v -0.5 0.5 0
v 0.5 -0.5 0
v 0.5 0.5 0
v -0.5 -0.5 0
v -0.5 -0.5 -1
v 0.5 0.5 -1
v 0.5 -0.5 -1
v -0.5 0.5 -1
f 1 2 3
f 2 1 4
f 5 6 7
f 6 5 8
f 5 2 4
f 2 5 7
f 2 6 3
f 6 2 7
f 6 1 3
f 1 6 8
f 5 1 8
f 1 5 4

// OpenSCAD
// http://www.openscad.org/downloads.html

h180= 2.23606798;
h90 = 2.05817103;
h60 = 1.73205081;
h45 = 1.42663106;
h36 = 1.25226119;

a180  = 0.44721359;
ZL180 = 0.89442719; ZH180 = h180 - ZL180;
points_list180 = [
    [ 0,     0,    0     ],
    [ a180,  0,    ZL180 ],
    [-a180,  0,    ZH180 ],
    [ 0,     0,    h180  ]];

a_90  = 0.61803398;
ZL_90 = 0.78615138; ZH_90 = h90 - ZL_90;
points_list90 = [
    [ 0,     0,    0     ],
    [ a_90,  0,    ZL_90 ],
    [ 0,     a_90, ZH_90 ],
    [-a_90,  0,    ZL_90 ],
    [ 0,    -a_90, ZH_90 ],
    [ 0,     0,    h90   ]];

a_60  = 0.81649658; s32   = 0.86602540;
ZL_60 = 0.57735027; ZH_60 = h60 - ZL_60;
points_list60 = [
    [ 0,         0,        0     ],
    [ a_60,      0,        ZL_60 ],
    [ 0.5*a_60,  s32*a_60, ZH_60 ],
    [-0.5*a_60,  s32*a_60, ZL_60 ],
    [-a_60,      0,        ZH_60 ],
    [-0.5*a_60, -s32*a_60, ZL_60 ],
    [ 0.5*a_60, -s32*a_60, ZH_60 ],
    [ 0,     0,            h60   ]];

a_45  = 0.93185165; b_45  = 0.65891862;
ZL_45 = 0.36283949; ZH_45 = h45 - ZL_45;
points_list45 = [
    [ 0,     0,     0     ],
    [ a_45,  0,     ZL_45 ],
    [ b_45,  b_45,  ZH_45 ],
    [ 0,     a_45,  ZL_45 ],
    [-b_45,  b_45,  ZH_45 ],
    [-a_45,  0,     ZL_45 ],
    [-b_45, -b_45,  ZH_45 ],
    [ 0,    -a_45,  ZL_45 ],
    [ b_45, -b_45,  ZH_45 ],
    [ 0,     0,     h45   ]];

a_36  = 0.97392904;
s1 = 0.58778525; s2 = 0.95105652;
c1 = 0.80901699; c2 = 0.30901699;
ZL_36 = 0.22685287; ZH_36 = h36 - ZL_36;
points_list36 = [
    [ 0,        0,        0     ],
    [ a_36,     0,        ZL_36 ],
    [ c1*a_36,  s1*a_36,  ZH_36 ],
    [ c2*a_36,  s2*a_36,  ZL_36 ],
    [-c2*a_36,  s2*a_36,  ZH_36 ],
    [-c1*a_36,  s1*a_36,  ZL_36 ],
    [-a_36,     0,        ZH_36 ],
    [-c1*a_36, -s1*a_36,  ZL_36 ],
    [-c2*a_36, -s2*a_36,  ZH_36 ],
    [ c2*a_36, -s2*a_36,  ZL_36 ],
    [ c1*a_36, -s1*a_36,  ZH_36 ],
    [ 0,        0,        h36   ]];


module top36() {
  color([0.9,0.3,0.2])
    polyhedron( points=points_list36,
                triangles=[[2,1,11], [3,2,11], [4,3,11], [5,4,11],
                           [6,5,11], [7,6,11], [8,7,11], [9,8,11],
                          [10,9,11],[1,10,11]] ); }                
module top45() {
  color([0.9,0.3,0.2])
    polyhedron( points=points_list45,
                triangles=[[2,1,9], [3,2,9], [4,3,9], [5,4,9],
                           [6,5,9], [7,6,9], [8,7,9], [1,8,9]] ); }
module top60() {
  color([0.9,0.3,0.2])
    polyhedron( points=points_list60,
                triangles=[[2,1,7], [3,2,7], [4,3,7], [5,4,7],
                           [6,5,7], [1,6,7]] ); }
module top90() {
  color([0.9,0.3,0.2])
    polyhedron( points=points_list90,
                triangles=[[2,1,5], [3,2,5], [4,3,5], [1,4,5]] ); }

module top180() {
  color([0.9,0.3,0.2])
    polyhedron( points=points_list180,     triangles=[[2,1,3]] ); }

module bottom36() {
  color([0.2,0.3,0.9])
    polyhedron( points=points_list36,
                triangles=[[1,2,0], [2,3,0], [3,4,0], [4,5,0],
                           [5,6,0], [6,7,0], [7,8,0], [8,9,0],
                          [9,10,0],[10,1,0]] ); }
module bottom45() {
  color([0.2,0.3,0.9])
    polyhedron( points=points_list45,
                triangles=[[1,2,0], [2,3,0], [3,4,0], [4,5,0],
                           [5,6,0], [6,7,0], [7,8,0], [8,1,0]] ); }
module bottom60() {
  color([0.2,0.3,0.9])
    polyhedron( points=points_list60,
                triangles=[[1,2,0], [2,3,0], [3,4,0], [4,5,0],
                           [5,6,0], [6,1,0]] ); }
module bottom90() {
  color([0.2,0.3,0.9])
    polyhedron( points=points_list90,
                triangles=[[1,2,0], [2,3,0], [3,4,0], [4,1,0]] ); }

module bottom180() {
  color([0.2,0.3,0.9])
    polyhedron( points=points_list180,      triangles=[[1,2,0]]); }

module thing36() {   top36();   bottom36();    }
module thing45() {   top45();   bottom45();    }
module thing60() {   top60();   bottom60();    }
module thing90() {   top90();   bottom90();    }
module thing180(){   top180();  bottom180();   }

translate([-4, 0, 0]) thing36();
translate([-2, 0, 0]) thing45();
translate([ 0, 0, 0]) thing60();
translate([ 2, 0, 0]) thing90();
translate([ 4, 0, 0]) thing180();
translate([ 0, 0, -0.5]) cube([1,1,1], center=true);
